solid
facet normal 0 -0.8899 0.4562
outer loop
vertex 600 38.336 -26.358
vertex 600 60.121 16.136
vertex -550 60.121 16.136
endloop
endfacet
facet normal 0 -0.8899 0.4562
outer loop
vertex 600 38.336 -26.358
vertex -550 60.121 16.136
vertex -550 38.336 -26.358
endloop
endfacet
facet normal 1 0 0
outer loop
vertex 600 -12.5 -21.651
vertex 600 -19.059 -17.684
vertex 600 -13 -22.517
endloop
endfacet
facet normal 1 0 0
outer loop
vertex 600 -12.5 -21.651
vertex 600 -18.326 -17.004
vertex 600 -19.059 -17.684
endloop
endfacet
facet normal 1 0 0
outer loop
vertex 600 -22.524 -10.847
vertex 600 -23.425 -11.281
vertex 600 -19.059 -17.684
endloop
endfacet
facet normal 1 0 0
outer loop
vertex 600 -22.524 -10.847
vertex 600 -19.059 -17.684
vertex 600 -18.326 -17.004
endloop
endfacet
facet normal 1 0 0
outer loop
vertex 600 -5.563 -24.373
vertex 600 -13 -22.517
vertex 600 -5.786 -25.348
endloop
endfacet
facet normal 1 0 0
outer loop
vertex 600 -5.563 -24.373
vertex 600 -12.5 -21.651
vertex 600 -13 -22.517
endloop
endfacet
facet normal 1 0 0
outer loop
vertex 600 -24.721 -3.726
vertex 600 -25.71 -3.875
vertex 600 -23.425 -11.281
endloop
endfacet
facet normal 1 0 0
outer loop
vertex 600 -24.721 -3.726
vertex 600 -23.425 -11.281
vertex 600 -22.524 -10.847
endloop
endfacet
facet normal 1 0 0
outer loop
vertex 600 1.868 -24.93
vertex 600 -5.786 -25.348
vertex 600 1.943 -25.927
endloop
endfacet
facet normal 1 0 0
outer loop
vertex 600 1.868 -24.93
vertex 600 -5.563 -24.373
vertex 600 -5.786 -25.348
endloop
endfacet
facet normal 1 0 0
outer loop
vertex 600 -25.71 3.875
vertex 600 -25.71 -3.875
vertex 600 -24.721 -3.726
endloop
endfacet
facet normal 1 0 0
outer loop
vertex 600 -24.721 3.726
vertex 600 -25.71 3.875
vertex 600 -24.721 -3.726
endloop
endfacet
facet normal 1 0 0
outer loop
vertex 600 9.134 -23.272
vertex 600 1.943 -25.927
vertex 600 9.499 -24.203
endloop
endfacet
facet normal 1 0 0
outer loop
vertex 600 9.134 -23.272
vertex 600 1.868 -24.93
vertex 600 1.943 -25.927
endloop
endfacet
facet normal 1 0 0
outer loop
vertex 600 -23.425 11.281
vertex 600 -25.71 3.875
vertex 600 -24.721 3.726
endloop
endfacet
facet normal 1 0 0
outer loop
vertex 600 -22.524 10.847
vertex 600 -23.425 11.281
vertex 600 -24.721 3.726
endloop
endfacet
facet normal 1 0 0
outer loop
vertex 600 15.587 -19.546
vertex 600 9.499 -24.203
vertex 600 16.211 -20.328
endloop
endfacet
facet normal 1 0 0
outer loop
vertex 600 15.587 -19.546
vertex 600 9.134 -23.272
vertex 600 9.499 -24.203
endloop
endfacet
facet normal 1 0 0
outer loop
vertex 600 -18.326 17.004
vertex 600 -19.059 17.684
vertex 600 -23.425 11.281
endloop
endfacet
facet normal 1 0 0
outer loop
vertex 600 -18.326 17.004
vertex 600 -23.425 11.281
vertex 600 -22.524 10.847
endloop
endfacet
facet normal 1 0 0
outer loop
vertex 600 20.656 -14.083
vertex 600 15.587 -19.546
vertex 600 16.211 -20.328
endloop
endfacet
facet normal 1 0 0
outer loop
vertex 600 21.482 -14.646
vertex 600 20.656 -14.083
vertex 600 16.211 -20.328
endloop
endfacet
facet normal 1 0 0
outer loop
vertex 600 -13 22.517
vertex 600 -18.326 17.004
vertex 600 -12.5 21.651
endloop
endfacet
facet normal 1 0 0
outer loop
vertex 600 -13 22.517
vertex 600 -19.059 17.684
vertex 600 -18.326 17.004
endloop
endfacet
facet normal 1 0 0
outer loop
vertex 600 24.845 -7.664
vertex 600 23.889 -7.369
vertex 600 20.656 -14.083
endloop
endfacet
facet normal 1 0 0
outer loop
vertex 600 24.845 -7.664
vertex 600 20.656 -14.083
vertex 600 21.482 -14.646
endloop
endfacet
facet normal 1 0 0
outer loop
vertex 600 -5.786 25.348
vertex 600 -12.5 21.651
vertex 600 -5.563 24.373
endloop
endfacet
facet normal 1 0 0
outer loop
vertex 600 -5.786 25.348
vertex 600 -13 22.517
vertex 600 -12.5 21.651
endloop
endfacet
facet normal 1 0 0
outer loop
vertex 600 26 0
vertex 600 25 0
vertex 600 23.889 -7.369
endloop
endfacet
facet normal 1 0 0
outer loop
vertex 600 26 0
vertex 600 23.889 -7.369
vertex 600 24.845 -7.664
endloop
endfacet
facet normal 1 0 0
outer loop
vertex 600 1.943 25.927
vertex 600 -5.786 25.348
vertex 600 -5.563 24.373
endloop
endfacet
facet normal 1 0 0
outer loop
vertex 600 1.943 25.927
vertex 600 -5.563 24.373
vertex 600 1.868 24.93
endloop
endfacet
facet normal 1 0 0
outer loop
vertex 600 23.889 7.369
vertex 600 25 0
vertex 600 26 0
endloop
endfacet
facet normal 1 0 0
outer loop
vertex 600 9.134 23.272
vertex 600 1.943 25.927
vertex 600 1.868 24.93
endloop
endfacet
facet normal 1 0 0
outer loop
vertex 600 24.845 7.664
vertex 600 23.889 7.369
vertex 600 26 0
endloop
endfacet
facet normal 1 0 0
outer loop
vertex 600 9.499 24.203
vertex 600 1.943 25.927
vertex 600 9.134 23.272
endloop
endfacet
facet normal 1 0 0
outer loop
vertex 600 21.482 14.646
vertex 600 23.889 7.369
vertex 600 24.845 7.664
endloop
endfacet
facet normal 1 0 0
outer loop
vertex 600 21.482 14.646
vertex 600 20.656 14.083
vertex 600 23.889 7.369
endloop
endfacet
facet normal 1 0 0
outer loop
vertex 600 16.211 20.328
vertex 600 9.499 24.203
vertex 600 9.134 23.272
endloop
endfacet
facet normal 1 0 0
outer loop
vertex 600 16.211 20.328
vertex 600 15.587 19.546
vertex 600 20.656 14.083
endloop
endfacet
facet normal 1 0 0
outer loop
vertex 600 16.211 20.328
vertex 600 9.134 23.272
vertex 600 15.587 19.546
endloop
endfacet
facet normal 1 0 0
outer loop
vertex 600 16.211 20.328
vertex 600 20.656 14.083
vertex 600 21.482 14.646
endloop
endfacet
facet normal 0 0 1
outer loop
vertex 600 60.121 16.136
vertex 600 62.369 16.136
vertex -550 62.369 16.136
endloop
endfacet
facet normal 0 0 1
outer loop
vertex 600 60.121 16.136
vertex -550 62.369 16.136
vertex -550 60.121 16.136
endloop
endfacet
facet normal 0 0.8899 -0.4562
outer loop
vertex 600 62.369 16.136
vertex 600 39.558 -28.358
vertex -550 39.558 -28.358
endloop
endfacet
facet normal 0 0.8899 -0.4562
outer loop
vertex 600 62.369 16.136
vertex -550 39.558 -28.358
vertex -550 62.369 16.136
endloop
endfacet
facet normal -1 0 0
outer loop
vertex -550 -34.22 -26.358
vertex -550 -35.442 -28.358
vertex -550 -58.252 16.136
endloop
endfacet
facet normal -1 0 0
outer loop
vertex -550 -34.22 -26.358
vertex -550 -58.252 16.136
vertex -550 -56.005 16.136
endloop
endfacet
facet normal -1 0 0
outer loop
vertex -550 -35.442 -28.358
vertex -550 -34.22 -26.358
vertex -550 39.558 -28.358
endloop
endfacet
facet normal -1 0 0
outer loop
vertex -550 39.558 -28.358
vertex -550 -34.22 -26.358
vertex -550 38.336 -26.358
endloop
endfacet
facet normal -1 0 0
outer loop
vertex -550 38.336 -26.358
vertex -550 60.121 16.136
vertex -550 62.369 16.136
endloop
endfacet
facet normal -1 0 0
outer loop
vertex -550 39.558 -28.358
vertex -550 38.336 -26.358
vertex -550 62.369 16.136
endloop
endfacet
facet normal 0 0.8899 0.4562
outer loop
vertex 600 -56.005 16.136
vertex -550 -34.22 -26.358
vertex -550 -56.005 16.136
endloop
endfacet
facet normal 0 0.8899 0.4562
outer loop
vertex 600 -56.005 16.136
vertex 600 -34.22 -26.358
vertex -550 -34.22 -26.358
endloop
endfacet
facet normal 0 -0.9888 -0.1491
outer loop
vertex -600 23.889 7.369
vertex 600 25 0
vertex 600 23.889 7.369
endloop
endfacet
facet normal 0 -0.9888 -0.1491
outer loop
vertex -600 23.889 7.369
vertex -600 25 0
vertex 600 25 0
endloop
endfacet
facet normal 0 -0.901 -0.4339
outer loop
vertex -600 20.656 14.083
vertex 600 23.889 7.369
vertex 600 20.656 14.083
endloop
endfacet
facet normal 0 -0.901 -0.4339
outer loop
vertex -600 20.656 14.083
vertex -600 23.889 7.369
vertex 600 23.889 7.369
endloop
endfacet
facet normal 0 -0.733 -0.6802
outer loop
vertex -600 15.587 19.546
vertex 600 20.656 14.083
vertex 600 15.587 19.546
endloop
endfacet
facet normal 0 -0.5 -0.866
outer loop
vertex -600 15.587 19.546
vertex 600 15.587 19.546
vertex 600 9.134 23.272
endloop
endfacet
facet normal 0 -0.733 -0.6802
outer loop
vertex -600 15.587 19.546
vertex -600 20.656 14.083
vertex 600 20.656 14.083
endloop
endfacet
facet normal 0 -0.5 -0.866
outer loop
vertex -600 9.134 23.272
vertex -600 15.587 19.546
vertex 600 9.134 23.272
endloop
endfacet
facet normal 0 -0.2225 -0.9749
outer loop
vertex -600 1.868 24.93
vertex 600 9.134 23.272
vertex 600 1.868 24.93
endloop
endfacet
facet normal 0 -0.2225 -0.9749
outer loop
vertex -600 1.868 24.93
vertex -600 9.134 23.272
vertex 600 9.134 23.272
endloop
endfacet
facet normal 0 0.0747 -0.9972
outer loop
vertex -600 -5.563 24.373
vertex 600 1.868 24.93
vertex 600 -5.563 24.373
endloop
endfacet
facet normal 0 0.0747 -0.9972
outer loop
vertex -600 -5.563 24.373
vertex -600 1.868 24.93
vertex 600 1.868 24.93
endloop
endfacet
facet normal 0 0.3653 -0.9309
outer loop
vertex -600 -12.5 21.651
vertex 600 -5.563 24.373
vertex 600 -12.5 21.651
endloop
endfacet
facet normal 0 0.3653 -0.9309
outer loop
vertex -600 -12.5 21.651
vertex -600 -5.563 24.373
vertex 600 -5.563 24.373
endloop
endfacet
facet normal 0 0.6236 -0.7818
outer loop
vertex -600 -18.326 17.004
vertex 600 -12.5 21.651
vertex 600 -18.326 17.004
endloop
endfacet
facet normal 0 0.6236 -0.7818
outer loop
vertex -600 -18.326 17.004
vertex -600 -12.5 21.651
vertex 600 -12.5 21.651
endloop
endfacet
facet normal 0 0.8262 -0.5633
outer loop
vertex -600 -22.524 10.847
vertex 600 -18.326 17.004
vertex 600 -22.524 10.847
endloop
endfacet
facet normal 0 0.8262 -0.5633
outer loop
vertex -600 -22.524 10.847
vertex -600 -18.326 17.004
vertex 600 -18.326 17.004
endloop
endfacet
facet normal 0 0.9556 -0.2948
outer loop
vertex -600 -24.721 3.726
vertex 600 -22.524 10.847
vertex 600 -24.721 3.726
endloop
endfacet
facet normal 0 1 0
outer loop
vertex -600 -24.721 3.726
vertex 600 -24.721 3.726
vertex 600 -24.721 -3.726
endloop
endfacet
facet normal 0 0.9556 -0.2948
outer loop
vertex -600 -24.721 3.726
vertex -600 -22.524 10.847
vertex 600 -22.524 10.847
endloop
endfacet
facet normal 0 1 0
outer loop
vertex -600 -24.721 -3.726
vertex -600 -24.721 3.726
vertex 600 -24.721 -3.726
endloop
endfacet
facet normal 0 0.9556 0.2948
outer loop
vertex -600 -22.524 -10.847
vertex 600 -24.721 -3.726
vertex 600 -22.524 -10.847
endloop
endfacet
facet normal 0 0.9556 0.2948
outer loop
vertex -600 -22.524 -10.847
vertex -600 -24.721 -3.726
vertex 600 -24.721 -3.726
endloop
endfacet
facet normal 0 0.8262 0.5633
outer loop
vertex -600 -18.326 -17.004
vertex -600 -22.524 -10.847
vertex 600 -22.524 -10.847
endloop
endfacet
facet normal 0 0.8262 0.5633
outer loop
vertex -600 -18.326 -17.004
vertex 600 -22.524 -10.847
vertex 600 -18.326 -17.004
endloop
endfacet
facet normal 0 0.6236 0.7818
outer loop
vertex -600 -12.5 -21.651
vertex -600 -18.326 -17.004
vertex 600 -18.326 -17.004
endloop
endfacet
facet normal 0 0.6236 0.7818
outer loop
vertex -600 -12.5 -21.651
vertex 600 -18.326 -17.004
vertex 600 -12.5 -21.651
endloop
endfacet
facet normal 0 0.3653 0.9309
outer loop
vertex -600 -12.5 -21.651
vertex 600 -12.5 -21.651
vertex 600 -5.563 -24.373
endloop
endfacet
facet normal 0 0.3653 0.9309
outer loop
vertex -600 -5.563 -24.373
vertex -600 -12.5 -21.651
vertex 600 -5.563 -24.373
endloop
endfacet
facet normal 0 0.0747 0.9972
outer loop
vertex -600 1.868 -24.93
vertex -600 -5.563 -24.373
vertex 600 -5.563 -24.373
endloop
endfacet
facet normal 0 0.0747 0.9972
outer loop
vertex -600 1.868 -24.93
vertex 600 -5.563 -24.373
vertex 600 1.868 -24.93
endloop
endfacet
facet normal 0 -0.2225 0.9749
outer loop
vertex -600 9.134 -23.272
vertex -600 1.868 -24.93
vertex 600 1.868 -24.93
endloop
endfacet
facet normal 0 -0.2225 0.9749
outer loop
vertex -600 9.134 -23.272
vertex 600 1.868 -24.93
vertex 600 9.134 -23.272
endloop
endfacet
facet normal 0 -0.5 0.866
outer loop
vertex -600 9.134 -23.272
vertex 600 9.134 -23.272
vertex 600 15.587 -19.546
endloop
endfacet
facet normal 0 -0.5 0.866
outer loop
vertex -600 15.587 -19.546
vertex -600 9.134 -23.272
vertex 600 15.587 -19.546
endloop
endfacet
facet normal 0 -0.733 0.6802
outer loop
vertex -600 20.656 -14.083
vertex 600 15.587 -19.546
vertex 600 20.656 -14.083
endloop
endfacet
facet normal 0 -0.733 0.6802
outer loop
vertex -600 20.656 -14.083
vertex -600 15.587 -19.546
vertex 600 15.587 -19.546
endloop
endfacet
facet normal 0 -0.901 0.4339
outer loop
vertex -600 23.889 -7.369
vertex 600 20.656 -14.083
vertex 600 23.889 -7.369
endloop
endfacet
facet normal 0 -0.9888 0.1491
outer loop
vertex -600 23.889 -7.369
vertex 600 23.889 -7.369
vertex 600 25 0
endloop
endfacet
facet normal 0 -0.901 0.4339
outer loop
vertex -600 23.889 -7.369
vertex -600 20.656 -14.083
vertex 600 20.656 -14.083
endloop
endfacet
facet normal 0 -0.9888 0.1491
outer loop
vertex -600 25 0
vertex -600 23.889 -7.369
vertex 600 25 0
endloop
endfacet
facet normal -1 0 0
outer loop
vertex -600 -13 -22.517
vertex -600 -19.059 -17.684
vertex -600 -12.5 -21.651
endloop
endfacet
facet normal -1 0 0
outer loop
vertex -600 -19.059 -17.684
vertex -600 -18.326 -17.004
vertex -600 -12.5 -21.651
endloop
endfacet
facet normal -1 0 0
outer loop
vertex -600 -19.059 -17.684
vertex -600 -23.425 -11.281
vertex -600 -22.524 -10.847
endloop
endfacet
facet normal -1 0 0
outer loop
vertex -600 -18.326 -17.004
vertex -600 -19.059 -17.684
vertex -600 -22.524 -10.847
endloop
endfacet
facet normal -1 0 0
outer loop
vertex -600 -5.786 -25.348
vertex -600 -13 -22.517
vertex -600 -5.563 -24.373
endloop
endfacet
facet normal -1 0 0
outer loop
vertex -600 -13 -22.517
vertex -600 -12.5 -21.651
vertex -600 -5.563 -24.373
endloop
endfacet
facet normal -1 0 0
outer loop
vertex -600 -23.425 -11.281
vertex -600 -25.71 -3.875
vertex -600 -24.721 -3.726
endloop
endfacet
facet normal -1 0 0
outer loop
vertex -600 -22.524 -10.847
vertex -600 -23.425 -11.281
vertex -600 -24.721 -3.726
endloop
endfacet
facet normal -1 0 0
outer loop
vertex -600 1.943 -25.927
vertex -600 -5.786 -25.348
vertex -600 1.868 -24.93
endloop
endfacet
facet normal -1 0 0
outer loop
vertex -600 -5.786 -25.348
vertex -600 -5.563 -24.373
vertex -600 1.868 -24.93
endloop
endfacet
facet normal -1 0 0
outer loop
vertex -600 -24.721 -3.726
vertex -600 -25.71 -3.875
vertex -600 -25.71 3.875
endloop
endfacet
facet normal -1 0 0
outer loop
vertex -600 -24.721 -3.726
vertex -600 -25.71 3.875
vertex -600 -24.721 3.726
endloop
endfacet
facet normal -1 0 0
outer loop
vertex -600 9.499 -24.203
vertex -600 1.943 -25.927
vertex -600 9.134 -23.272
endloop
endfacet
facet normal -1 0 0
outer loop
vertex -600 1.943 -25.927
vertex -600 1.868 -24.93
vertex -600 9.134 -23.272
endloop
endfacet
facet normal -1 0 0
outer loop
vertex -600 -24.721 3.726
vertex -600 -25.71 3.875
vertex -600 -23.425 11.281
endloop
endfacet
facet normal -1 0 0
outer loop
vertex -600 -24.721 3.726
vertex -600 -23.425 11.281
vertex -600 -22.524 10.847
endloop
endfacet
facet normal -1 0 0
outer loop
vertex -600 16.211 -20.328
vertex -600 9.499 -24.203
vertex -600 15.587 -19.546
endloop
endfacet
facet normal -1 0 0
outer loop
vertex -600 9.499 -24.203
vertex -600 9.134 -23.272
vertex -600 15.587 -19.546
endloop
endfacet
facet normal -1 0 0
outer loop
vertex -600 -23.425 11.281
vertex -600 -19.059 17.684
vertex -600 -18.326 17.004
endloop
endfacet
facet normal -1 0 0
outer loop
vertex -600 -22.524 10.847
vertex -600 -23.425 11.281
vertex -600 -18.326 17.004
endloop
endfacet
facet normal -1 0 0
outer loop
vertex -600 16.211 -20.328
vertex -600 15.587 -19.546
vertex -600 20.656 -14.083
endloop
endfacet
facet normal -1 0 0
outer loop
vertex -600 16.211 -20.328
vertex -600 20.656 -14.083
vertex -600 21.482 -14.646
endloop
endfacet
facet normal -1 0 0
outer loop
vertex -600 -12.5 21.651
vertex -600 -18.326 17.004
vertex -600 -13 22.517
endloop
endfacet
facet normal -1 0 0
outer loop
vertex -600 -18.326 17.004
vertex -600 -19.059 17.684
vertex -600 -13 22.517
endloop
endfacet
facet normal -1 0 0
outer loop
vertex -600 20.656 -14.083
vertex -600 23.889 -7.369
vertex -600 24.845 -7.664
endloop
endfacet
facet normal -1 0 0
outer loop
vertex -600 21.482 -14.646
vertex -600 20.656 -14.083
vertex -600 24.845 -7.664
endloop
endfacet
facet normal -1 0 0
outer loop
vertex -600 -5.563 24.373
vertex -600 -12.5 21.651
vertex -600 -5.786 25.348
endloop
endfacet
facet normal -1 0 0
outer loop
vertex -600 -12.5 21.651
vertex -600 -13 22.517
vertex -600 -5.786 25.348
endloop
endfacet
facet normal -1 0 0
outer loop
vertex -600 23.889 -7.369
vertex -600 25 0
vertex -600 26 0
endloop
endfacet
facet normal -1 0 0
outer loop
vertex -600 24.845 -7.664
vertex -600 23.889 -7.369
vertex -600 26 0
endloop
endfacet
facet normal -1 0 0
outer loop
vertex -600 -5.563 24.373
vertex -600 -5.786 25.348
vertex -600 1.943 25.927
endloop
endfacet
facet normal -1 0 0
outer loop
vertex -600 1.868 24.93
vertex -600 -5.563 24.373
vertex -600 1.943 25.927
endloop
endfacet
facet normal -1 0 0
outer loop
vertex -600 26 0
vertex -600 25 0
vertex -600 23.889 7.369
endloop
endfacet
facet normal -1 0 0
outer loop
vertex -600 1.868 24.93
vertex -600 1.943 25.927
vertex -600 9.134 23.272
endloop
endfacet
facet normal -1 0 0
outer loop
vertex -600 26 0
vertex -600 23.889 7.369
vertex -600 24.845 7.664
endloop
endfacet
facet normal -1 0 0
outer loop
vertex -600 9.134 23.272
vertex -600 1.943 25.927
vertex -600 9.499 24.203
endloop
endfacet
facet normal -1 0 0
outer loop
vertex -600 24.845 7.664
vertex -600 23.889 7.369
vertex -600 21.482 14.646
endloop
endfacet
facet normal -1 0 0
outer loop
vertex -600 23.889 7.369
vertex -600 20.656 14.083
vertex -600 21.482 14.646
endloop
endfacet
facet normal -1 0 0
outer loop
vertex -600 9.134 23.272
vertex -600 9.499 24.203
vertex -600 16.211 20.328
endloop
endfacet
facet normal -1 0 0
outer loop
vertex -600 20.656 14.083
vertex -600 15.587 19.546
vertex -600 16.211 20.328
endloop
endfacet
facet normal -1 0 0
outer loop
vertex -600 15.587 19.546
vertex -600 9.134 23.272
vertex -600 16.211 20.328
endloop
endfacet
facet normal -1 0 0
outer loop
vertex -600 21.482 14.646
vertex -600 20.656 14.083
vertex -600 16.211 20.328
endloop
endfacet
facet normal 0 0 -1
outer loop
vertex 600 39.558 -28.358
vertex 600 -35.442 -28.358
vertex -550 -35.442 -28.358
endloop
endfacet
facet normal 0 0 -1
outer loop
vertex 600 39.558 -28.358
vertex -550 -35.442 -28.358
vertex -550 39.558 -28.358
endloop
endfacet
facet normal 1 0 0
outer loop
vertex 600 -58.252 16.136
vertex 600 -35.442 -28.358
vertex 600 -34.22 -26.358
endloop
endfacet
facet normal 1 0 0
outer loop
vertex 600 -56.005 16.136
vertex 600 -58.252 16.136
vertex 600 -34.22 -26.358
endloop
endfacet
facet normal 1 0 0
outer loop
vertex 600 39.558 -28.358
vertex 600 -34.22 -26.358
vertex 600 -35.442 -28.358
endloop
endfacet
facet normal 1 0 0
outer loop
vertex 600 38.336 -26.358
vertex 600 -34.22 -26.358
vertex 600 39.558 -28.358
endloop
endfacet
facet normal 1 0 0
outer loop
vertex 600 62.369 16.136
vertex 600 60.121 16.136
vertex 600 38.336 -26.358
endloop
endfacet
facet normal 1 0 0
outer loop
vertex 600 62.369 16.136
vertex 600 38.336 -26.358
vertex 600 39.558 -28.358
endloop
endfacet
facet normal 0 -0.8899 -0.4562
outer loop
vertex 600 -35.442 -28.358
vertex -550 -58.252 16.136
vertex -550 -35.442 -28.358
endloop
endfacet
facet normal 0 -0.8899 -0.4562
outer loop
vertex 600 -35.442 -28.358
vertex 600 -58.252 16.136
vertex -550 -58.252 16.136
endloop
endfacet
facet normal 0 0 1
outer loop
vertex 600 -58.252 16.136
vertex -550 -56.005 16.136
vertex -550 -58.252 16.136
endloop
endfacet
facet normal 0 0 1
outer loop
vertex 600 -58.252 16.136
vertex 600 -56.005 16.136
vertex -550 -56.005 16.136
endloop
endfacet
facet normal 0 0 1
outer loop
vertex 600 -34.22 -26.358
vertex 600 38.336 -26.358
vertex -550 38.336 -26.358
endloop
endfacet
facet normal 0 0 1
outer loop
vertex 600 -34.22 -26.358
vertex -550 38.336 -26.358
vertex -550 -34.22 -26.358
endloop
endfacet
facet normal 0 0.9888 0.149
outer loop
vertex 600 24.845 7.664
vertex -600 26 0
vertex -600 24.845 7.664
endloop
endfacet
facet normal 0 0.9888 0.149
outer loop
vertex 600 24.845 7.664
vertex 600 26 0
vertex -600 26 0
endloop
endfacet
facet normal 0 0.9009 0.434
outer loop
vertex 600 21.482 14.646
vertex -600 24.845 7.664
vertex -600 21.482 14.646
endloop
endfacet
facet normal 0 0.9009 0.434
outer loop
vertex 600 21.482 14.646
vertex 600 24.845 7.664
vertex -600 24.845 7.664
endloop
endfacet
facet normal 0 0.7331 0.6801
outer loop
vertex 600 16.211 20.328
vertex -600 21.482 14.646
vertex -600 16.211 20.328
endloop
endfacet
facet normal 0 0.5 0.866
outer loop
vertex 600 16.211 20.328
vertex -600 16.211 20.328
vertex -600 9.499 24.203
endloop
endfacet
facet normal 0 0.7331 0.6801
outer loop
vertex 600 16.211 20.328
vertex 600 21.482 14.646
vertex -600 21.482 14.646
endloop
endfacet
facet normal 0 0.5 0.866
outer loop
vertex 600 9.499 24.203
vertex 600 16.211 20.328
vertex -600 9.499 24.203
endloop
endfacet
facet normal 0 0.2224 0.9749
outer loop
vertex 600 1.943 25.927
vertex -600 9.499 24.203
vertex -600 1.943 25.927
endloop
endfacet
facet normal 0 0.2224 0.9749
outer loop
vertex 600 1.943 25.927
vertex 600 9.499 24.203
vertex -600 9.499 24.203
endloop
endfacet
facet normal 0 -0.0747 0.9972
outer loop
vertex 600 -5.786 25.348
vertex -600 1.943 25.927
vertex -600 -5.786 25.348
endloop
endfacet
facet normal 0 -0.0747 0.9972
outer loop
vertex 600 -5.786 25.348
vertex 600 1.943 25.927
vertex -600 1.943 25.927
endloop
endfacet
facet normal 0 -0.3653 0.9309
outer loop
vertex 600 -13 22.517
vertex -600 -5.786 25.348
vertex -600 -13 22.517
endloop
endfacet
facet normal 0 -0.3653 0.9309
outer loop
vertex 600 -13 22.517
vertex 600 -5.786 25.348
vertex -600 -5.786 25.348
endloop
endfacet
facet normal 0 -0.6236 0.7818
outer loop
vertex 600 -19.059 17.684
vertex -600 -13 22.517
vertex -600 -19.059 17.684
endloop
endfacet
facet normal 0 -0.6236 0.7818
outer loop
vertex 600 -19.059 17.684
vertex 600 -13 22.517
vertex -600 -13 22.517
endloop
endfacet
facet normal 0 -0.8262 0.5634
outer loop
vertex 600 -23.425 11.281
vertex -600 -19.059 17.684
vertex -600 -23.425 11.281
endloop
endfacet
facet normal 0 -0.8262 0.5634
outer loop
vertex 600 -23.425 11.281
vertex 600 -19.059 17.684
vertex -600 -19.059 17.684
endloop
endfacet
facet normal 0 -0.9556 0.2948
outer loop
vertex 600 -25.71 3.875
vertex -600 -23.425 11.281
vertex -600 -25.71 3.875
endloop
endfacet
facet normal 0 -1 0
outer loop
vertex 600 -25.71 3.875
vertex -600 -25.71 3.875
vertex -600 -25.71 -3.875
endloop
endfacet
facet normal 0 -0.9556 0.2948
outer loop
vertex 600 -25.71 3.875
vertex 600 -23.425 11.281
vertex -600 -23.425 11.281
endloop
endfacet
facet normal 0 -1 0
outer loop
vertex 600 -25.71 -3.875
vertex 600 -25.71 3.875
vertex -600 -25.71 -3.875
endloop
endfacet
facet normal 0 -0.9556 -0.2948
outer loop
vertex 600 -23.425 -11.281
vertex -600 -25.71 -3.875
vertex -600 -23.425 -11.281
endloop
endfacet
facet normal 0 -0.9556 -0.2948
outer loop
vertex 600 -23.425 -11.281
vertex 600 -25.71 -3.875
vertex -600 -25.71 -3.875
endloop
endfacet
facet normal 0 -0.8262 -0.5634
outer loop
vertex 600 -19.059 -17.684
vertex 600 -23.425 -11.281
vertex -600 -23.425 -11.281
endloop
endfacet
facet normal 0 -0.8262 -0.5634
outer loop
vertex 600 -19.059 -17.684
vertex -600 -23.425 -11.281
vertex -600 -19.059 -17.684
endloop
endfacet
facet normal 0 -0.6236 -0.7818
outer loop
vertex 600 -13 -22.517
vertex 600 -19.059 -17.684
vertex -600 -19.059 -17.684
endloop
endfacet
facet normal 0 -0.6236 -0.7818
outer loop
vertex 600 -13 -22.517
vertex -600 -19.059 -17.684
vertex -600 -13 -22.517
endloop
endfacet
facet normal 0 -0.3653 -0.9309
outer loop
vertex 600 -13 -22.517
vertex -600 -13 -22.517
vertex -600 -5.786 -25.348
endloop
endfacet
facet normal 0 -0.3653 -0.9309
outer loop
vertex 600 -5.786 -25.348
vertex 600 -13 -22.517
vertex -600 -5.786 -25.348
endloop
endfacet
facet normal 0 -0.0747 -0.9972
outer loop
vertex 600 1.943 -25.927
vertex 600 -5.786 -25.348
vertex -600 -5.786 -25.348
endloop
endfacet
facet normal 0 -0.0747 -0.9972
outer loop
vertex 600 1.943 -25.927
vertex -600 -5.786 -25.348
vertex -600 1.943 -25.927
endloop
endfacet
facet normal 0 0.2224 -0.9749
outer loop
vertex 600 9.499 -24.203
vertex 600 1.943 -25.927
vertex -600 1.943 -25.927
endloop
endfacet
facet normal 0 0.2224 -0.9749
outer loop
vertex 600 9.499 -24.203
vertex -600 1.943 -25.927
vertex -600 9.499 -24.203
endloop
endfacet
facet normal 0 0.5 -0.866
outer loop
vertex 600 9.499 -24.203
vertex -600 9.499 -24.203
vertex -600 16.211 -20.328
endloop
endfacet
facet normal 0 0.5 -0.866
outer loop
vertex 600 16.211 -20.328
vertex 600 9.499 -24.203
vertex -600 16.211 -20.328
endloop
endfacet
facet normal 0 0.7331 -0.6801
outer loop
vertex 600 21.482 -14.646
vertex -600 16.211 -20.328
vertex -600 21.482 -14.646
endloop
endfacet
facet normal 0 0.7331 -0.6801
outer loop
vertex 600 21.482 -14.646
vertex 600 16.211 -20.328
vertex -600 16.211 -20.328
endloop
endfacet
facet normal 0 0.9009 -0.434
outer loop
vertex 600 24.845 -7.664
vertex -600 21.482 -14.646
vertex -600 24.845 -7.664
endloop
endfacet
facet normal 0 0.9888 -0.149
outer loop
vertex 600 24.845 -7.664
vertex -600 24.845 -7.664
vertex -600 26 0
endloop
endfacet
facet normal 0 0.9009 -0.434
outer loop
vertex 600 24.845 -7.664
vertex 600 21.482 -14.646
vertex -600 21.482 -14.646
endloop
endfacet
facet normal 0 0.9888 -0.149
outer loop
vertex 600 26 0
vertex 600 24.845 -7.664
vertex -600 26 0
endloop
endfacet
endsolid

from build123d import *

# Parameters (mm, degrees)
F1_DEPTH      = 600
F1_DEPTH_BACK = 550
F2_R          = 26
F2_R_2        = 25
F3_DEPTH      = 600


with BuildPart() as f1:
    # F0 (on Right) → F1 (new body, two sides)
    with BuildSketch(Plane.YZ) as f1_sk:
        Polygon((-58.252042, 16.136102), (-35.441691, -28.357581), (39.558309, -28.357581), (62.36866, 16.136102), (60.12115, 16.136102), (38.336129, -26.357581), (-34.219511, -26.357581), (-56.004532, 16.136102), align=None)
    extrude(amount=F1_DEPTH)
    extrude(f1_sk.sketch, amount=-F1_DEPTH_BACK)


with BuildPart() as f3:
    # F2 (on Right) → F3 (new body, symmetric)
    with BuildSketch(Plane.YZ):
        Circle(F2_R)
        Circle(F2_R_2, mode=Mode.SUBTRACT)
    extrude(amount=F3_DEPTH, both=True)


solid = Compound([f1.part, f3.part])
